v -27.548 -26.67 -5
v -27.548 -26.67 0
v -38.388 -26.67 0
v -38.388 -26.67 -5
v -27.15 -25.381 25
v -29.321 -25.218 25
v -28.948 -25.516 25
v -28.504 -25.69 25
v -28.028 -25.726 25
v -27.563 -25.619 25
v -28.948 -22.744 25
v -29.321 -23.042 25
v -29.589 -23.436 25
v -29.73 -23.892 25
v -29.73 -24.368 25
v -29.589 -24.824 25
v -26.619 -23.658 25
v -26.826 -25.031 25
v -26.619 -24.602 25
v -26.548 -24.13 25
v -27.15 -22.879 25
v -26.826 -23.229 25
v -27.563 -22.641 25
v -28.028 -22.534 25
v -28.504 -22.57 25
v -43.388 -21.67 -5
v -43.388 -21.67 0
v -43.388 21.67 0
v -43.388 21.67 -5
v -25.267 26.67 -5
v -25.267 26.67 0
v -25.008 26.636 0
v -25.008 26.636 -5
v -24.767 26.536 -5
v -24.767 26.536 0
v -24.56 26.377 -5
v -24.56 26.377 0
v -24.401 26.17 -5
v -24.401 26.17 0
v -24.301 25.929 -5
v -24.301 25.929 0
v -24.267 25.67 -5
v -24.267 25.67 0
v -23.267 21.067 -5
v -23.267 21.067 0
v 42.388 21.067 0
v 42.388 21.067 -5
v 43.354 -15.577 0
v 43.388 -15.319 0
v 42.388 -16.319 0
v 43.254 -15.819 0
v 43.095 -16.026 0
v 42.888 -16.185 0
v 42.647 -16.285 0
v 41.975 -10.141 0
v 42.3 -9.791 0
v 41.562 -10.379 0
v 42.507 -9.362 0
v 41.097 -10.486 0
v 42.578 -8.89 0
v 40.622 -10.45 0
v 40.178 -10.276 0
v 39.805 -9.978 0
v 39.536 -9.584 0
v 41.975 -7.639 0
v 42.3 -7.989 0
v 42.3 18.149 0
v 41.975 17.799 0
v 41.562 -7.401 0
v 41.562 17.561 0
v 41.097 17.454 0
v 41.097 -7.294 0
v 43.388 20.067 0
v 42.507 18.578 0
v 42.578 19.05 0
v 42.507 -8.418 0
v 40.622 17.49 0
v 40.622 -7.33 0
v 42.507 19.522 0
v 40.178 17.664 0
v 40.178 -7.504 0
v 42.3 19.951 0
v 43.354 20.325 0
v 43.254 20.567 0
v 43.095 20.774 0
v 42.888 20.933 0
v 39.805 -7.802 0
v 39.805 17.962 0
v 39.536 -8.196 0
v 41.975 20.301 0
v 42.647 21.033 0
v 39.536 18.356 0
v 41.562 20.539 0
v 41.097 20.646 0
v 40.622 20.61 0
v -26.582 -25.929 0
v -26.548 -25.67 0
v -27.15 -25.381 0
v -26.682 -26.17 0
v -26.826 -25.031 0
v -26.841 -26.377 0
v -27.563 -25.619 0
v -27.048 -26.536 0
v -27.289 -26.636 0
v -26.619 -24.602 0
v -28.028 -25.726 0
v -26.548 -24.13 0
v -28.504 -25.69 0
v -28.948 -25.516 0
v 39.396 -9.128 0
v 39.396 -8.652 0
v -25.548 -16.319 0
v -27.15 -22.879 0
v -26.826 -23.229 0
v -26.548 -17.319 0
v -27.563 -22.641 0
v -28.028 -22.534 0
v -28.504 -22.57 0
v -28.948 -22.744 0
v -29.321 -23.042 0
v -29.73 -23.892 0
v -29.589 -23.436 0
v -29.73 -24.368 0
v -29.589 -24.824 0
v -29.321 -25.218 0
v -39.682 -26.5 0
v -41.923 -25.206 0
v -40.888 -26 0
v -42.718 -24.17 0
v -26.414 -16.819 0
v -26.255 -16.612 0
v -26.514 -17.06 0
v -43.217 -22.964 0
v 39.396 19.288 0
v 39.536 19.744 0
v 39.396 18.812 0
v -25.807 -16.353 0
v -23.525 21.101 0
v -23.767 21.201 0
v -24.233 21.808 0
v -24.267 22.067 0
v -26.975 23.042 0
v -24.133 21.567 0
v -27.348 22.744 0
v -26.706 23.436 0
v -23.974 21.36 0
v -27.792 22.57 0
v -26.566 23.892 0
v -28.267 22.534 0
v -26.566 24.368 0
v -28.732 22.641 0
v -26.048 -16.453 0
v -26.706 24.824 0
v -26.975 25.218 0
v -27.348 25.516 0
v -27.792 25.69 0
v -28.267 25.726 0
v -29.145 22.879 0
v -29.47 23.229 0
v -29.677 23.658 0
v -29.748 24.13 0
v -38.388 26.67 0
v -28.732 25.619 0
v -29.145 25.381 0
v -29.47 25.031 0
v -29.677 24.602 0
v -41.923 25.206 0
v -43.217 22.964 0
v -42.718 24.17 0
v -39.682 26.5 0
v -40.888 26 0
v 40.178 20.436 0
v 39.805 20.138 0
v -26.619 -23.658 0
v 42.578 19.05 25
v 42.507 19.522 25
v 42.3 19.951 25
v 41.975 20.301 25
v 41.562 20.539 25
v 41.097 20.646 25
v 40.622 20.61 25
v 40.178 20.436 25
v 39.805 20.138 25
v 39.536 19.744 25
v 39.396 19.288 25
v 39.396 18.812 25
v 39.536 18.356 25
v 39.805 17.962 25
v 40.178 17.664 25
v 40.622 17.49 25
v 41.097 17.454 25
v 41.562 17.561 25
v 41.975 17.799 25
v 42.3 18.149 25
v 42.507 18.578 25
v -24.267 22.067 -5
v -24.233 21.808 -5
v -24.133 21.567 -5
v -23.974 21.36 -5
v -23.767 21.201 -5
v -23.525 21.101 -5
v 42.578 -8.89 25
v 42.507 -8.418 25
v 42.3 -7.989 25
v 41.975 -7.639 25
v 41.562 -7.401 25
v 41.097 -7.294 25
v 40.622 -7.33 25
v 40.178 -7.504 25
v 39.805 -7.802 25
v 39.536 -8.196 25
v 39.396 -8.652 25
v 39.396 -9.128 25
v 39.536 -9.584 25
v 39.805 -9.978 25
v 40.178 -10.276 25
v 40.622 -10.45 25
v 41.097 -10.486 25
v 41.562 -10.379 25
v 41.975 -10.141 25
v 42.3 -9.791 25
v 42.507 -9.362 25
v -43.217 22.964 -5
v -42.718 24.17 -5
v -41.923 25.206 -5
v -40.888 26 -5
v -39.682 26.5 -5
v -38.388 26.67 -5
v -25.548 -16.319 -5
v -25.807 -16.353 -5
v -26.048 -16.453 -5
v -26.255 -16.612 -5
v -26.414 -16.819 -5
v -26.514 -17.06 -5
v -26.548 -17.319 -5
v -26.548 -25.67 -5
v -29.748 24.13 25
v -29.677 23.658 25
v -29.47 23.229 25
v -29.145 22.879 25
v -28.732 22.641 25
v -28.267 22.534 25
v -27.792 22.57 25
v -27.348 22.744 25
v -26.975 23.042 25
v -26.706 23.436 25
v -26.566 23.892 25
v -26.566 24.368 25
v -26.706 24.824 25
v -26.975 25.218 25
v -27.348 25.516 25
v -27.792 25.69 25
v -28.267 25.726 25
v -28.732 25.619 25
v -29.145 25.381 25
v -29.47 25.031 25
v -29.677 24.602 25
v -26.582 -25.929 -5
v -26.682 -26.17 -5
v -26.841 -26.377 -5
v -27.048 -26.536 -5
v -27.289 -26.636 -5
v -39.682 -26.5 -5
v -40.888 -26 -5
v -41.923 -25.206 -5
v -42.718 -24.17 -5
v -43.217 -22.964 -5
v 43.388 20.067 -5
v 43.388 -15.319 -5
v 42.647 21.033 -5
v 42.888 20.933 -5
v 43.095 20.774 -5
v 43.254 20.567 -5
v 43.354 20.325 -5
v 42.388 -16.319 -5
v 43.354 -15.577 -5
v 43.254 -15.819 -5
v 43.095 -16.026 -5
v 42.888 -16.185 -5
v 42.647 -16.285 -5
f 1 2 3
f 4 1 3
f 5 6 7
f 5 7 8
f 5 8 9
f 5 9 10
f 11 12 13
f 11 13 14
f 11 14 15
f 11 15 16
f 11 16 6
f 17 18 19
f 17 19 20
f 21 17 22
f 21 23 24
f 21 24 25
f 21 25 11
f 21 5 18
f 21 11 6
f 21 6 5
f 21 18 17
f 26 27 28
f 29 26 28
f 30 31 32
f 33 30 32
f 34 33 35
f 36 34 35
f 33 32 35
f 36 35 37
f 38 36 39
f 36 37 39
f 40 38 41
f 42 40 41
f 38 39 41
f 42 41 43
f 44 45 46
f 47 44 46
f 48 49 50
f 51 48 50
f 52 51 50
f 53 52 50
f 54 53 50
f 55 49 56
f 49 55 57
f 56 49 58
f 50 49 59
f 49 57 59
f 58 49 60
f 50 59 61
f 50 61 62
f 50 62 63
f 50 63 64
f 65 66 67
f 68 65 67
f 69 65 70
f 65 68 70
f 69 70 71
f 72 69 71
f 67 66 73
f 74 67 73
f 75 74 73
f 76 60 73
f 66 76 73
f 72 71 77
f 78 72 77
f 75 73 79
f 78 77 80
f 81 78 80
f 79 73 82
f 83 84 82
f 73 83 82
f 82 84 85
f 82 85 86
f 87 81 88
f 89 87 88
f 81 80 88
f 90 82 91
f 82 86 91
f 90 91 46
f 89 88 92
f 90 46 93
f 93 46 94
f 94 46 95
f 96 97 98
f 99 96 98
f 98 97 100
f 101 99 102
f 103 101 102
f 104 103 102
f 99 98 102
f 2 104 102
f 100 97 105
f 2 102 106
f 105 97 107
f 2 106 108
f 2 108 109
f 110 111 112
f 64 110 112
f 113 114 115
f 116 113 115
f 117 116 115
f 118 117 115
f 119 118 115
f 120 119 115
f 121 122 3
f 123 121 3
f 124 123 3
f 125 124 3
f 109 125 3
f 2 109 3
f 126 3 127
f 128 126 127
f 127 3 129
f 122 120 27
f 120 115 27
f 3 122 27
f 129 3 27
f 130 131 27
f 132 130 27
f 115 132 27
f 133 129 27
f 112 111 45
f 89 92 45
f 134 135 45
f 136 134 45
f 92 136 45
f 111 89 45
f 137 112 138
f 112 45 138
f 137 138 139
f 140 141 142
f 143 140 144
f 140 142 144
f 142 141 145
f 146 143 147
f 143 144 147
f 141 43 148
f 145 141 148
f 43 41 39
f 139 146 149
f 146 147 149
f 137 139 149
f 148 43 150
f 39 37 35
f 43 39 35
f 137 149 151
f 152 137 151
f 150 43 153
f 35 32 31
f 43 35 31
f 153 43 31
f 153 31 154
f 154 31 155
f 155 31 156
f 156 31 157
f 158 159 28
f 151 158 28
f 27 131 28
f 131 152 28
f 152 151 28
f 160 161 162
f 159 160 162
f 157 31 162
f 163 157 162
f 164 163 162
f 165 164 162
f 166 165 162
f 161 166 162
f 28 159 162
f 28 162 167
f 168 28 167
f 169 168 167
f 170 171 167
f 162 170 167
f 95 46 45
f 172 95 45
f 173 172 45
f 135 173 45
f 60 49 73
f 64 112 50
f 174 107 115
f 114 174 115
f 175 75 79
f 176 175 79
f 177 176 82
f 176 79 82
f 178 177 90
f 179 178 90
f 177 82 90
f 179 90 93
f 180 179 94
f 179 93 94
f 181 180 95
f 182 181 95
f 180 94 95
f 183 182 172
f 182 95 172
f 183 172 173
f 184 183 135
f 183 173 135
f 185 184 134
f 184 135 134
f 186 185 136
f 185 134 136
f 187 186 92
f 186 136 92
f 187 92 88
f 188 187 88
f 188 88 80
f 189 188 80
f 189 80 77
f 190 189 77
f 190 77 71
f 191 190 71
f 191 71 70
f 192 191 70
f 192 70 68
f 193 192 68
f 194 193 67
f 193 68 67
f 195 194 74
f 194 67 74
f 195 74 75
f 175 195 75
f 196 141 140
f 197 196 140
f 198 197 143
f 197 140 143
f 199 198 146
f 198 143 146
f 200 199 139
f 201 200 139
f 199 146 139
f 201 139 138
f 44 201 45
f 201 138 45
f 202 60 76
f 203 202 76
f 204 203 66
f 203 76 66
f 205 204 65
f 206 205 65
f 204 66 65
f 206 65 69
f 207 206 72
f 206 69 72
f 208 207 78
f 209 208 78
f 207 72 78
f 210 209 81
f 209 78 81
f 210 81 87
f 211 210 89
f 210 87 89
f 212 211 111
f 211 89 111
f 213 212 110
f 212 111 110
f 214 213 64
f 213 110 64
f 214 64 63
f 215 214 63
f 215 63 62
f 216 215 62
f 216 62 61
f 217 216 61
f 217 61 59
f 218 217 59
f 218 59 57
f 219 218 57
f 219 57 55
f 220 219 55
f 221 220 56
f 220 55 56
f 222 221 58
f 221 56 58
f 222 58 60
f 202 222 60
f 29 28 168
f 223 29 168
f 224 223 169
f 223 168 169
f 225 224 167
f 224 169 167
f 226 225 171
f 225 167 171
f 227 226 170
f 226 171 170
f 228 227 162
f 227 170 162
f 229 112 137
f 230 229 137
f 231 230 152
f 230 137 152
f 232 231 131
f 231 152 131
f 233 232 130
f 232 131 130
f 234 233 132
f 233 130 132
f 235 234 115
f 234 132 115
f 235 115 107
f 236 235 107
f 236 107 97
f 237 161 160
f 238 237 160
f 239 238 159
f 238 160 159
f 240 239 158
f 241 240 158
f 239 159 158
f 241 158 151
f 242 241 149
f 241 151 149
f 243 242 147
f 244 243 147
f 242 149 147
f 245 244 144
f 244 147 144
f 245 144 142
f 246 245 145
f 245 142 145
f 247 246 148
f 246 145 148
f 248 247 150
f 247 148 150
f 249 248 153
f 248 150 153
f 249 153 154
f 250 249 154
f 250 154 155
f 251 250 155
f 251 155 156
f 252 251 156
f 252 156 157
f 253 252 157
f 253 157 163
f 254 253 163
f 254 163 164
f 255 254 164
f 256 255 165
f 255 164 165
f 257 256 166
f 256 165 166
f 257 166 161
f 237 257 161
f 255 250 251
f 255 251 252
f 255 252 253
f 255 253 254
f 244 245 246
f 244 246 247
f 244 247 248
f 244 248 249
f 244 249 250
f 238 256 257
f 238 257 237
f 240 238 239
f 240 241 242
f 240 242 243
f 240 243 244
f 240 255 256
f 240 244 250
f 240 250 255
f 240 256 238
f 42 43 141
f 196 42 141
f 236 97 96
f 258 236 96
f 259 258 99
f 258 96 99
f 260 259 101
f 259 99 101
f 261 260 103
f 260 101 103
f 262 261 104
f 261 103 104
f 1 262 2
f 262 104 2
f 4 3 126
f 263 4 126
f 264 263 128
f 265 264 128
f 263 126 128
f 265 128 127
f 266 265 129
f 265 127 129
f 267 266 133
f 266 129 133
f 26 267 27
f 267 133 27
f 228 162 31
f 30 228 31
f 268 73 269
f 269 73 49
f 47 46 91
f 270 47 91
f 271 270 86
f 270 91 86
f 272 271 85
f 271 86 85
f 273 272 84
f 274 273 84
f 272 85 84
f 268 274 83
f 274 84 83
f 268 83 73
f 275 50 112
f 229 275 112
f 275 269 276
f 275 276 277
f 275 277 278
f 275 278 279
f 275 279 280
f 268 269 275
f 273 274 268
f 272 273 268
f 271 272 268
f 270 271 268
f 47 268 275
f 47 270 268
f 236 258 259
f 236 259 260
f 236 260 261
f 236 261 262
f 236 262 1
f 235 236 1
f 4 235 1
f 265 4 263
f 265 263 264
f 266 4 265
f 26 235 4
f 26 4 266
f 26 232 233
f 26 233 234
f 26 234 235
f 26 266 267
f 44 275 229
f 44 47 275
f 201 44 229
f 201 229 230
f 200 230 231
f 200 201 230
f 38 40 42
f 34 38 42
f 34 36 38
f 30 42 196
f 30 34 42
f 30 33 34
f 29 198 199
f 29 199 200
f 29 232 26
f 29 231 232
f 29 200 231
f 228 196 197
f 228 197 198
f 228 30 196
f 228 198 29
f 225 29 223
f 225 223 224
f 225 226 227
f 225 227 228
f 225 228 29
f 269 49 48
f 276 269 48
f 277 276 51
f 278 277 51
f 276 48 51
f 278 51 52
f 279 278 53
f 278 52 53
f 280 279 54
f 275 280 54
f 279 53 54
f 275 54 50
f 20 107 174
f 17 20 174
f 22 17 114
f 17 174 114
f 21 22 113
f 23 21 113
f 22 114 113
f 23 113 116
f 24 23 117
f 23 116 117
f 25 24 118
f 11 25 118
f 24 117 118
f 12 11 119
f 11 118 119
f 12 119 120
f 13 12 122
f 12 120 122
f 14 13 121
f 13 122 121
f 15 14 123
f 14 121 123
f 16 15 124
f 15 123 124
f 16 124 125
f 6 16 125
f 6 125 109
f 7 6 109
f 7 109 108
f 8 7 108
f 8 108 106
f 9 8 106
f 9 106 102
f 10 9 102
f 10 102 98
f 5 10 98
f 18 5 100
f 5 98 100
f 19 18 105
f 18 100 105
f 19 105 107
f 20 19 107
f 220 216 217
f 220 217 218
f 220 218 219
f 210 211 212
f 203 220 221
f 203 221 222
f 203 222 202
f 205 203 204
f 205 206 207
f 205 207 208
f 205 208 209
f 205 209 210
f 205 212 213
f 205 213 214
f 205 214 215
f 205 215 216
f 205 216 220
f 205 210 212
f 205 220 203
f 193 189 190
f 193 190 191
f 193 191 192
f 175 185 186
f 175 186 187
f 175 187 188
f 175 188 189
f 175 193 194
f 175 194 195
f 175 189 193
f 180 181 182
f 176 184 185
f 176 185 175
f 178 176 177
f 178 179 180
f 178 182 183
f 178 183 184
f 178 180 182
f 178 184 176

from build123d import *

# Parameters (mm, degrees)
SKETCH1_R             = 1.6
BOSS_EXTRUDE2_DEPTH   = 25
BOSS_EXTRUDE2_2_DEPTH = 25
BOSS_EXTRUDE2_3_DEPTH = 25
BOSS_EXTRUDE2_4_DEPTH = 25
BOSS_EXTRUDE4_DEPTH   = 5


with BuildPart() as part:
    # Sketch1 → Boss-Extrude2 (new body)
    with BuildSketch(Plane.XY):
        with Locations((-28.14771299, -24.13)):
            Circle(SKETCH1_R)
    extrude(amount=BOSS_EXTRUDE2_DEPTH)



with BuildPart() as body_2:
    # Sketch1 → Boss-Extrude2 2 (new body)
    with BuildSketch(Plane.XY):
        with Locations((40.977777778, -8.89)):
            Circle(SKETCH1_R)
    extrude(amount=BOSS_EXTRUDE2_2_DEPTH)


with BuildPart() as body_3:
    # Sketch1 → Boss-Extrude2 3 (new body)
    with BuildSketch(Plane.XY):
        with Locations((40.977777778, 19.05)):
            Circle(SKETCH1_R)
    extrude(amount=BOSS_EXTRUDE2_3_DEPTH)


with BuildPart() as body_4:
    # Sketch1 → Boss-Extrude2 4 (new body)
    with BuildSketch(Plane.XY):
        with Locations((-28.14771299, 24.13)):
            Circle(SKETCH1_R)
    extrude(amount=BOSS_EXTRUDE2_4_DEPTH)


with BuildPart() as part_1:
    add(part.part)

    add(body_2.part)  # Boss-Extrude4 merges body 2

    add(body_3.part)  # Boss-Extrude4 merges body 3

    add(body_4.part)  # Boss-Extrude4 merges body 4
    # Sketch1<6> → Boss-Extrude4 (add)
    with BuildSketch(Plane.XY):
        with BuildLine():
            Line((-24.266666667, 25.67), (-24.266666667, 22.066666667))
            ThreePointArc((-24.266666667, 22.066666667), (-23.973773448, 21.359559885), (-23.266666667, 21.066666667))
            Line((-23.266666667, 21.066666667), (42.38771299, 21.066666667))
            ThreePointArc((42.38771299, 21.066666667), (43.094819771, 20.773773448), (43.38771299, 20.066666667))
            Line((43.38771299, 20.066666667), (43.38771299, -15.318617799))
            ThreePointArc((43.38771299, -15.318617799), (43.094819771, -16.02572458), (42.38771299, -16.318617799))
            Line((42.38771299, -16.318617799), (-25.54771299, -16.318617799))
            ThreePointArc((-25.54771299, -16.318617799), (-26.254819771, -16.611511017), (-26.54771299, -17.318617799))
            Line((-26.54771299, -17.318617799), (-26.54771299, -24.13))
            Line((-26.54771299, -24.13), (-26.54771299, -25.67))
            ThreePointArc((-26.54771299, -25.67), (-26.840606209, -26.377106781), (-27.54771299, -26.67))
            Line((-27.54771299, -26.67), (-38.38771299, -26.67))
            ThreePointArc((-38.38771299, -26.67), (-41.923246896, -25.205533906), (-43.38771299, -21.67))
            Line((-43.38771299, -21.67), (-43.38771299, 21.67))
            ThreePointArc((-43.38771299, 21.67), (-41.923246896, 25.205533906), (-38.38771299, 26.67))
            Line((-38.38771299, 26.67), (-25.266666667, 26.67))
            ThreePointArc((-25.266666667, 26.67), (-24.559559885, 26.377106781), (-24.266666667, 25.67))
        make_face()
    extrude(amount=-BOSS_EXTRUDE4_DEPTH)


solid = part_1.part
